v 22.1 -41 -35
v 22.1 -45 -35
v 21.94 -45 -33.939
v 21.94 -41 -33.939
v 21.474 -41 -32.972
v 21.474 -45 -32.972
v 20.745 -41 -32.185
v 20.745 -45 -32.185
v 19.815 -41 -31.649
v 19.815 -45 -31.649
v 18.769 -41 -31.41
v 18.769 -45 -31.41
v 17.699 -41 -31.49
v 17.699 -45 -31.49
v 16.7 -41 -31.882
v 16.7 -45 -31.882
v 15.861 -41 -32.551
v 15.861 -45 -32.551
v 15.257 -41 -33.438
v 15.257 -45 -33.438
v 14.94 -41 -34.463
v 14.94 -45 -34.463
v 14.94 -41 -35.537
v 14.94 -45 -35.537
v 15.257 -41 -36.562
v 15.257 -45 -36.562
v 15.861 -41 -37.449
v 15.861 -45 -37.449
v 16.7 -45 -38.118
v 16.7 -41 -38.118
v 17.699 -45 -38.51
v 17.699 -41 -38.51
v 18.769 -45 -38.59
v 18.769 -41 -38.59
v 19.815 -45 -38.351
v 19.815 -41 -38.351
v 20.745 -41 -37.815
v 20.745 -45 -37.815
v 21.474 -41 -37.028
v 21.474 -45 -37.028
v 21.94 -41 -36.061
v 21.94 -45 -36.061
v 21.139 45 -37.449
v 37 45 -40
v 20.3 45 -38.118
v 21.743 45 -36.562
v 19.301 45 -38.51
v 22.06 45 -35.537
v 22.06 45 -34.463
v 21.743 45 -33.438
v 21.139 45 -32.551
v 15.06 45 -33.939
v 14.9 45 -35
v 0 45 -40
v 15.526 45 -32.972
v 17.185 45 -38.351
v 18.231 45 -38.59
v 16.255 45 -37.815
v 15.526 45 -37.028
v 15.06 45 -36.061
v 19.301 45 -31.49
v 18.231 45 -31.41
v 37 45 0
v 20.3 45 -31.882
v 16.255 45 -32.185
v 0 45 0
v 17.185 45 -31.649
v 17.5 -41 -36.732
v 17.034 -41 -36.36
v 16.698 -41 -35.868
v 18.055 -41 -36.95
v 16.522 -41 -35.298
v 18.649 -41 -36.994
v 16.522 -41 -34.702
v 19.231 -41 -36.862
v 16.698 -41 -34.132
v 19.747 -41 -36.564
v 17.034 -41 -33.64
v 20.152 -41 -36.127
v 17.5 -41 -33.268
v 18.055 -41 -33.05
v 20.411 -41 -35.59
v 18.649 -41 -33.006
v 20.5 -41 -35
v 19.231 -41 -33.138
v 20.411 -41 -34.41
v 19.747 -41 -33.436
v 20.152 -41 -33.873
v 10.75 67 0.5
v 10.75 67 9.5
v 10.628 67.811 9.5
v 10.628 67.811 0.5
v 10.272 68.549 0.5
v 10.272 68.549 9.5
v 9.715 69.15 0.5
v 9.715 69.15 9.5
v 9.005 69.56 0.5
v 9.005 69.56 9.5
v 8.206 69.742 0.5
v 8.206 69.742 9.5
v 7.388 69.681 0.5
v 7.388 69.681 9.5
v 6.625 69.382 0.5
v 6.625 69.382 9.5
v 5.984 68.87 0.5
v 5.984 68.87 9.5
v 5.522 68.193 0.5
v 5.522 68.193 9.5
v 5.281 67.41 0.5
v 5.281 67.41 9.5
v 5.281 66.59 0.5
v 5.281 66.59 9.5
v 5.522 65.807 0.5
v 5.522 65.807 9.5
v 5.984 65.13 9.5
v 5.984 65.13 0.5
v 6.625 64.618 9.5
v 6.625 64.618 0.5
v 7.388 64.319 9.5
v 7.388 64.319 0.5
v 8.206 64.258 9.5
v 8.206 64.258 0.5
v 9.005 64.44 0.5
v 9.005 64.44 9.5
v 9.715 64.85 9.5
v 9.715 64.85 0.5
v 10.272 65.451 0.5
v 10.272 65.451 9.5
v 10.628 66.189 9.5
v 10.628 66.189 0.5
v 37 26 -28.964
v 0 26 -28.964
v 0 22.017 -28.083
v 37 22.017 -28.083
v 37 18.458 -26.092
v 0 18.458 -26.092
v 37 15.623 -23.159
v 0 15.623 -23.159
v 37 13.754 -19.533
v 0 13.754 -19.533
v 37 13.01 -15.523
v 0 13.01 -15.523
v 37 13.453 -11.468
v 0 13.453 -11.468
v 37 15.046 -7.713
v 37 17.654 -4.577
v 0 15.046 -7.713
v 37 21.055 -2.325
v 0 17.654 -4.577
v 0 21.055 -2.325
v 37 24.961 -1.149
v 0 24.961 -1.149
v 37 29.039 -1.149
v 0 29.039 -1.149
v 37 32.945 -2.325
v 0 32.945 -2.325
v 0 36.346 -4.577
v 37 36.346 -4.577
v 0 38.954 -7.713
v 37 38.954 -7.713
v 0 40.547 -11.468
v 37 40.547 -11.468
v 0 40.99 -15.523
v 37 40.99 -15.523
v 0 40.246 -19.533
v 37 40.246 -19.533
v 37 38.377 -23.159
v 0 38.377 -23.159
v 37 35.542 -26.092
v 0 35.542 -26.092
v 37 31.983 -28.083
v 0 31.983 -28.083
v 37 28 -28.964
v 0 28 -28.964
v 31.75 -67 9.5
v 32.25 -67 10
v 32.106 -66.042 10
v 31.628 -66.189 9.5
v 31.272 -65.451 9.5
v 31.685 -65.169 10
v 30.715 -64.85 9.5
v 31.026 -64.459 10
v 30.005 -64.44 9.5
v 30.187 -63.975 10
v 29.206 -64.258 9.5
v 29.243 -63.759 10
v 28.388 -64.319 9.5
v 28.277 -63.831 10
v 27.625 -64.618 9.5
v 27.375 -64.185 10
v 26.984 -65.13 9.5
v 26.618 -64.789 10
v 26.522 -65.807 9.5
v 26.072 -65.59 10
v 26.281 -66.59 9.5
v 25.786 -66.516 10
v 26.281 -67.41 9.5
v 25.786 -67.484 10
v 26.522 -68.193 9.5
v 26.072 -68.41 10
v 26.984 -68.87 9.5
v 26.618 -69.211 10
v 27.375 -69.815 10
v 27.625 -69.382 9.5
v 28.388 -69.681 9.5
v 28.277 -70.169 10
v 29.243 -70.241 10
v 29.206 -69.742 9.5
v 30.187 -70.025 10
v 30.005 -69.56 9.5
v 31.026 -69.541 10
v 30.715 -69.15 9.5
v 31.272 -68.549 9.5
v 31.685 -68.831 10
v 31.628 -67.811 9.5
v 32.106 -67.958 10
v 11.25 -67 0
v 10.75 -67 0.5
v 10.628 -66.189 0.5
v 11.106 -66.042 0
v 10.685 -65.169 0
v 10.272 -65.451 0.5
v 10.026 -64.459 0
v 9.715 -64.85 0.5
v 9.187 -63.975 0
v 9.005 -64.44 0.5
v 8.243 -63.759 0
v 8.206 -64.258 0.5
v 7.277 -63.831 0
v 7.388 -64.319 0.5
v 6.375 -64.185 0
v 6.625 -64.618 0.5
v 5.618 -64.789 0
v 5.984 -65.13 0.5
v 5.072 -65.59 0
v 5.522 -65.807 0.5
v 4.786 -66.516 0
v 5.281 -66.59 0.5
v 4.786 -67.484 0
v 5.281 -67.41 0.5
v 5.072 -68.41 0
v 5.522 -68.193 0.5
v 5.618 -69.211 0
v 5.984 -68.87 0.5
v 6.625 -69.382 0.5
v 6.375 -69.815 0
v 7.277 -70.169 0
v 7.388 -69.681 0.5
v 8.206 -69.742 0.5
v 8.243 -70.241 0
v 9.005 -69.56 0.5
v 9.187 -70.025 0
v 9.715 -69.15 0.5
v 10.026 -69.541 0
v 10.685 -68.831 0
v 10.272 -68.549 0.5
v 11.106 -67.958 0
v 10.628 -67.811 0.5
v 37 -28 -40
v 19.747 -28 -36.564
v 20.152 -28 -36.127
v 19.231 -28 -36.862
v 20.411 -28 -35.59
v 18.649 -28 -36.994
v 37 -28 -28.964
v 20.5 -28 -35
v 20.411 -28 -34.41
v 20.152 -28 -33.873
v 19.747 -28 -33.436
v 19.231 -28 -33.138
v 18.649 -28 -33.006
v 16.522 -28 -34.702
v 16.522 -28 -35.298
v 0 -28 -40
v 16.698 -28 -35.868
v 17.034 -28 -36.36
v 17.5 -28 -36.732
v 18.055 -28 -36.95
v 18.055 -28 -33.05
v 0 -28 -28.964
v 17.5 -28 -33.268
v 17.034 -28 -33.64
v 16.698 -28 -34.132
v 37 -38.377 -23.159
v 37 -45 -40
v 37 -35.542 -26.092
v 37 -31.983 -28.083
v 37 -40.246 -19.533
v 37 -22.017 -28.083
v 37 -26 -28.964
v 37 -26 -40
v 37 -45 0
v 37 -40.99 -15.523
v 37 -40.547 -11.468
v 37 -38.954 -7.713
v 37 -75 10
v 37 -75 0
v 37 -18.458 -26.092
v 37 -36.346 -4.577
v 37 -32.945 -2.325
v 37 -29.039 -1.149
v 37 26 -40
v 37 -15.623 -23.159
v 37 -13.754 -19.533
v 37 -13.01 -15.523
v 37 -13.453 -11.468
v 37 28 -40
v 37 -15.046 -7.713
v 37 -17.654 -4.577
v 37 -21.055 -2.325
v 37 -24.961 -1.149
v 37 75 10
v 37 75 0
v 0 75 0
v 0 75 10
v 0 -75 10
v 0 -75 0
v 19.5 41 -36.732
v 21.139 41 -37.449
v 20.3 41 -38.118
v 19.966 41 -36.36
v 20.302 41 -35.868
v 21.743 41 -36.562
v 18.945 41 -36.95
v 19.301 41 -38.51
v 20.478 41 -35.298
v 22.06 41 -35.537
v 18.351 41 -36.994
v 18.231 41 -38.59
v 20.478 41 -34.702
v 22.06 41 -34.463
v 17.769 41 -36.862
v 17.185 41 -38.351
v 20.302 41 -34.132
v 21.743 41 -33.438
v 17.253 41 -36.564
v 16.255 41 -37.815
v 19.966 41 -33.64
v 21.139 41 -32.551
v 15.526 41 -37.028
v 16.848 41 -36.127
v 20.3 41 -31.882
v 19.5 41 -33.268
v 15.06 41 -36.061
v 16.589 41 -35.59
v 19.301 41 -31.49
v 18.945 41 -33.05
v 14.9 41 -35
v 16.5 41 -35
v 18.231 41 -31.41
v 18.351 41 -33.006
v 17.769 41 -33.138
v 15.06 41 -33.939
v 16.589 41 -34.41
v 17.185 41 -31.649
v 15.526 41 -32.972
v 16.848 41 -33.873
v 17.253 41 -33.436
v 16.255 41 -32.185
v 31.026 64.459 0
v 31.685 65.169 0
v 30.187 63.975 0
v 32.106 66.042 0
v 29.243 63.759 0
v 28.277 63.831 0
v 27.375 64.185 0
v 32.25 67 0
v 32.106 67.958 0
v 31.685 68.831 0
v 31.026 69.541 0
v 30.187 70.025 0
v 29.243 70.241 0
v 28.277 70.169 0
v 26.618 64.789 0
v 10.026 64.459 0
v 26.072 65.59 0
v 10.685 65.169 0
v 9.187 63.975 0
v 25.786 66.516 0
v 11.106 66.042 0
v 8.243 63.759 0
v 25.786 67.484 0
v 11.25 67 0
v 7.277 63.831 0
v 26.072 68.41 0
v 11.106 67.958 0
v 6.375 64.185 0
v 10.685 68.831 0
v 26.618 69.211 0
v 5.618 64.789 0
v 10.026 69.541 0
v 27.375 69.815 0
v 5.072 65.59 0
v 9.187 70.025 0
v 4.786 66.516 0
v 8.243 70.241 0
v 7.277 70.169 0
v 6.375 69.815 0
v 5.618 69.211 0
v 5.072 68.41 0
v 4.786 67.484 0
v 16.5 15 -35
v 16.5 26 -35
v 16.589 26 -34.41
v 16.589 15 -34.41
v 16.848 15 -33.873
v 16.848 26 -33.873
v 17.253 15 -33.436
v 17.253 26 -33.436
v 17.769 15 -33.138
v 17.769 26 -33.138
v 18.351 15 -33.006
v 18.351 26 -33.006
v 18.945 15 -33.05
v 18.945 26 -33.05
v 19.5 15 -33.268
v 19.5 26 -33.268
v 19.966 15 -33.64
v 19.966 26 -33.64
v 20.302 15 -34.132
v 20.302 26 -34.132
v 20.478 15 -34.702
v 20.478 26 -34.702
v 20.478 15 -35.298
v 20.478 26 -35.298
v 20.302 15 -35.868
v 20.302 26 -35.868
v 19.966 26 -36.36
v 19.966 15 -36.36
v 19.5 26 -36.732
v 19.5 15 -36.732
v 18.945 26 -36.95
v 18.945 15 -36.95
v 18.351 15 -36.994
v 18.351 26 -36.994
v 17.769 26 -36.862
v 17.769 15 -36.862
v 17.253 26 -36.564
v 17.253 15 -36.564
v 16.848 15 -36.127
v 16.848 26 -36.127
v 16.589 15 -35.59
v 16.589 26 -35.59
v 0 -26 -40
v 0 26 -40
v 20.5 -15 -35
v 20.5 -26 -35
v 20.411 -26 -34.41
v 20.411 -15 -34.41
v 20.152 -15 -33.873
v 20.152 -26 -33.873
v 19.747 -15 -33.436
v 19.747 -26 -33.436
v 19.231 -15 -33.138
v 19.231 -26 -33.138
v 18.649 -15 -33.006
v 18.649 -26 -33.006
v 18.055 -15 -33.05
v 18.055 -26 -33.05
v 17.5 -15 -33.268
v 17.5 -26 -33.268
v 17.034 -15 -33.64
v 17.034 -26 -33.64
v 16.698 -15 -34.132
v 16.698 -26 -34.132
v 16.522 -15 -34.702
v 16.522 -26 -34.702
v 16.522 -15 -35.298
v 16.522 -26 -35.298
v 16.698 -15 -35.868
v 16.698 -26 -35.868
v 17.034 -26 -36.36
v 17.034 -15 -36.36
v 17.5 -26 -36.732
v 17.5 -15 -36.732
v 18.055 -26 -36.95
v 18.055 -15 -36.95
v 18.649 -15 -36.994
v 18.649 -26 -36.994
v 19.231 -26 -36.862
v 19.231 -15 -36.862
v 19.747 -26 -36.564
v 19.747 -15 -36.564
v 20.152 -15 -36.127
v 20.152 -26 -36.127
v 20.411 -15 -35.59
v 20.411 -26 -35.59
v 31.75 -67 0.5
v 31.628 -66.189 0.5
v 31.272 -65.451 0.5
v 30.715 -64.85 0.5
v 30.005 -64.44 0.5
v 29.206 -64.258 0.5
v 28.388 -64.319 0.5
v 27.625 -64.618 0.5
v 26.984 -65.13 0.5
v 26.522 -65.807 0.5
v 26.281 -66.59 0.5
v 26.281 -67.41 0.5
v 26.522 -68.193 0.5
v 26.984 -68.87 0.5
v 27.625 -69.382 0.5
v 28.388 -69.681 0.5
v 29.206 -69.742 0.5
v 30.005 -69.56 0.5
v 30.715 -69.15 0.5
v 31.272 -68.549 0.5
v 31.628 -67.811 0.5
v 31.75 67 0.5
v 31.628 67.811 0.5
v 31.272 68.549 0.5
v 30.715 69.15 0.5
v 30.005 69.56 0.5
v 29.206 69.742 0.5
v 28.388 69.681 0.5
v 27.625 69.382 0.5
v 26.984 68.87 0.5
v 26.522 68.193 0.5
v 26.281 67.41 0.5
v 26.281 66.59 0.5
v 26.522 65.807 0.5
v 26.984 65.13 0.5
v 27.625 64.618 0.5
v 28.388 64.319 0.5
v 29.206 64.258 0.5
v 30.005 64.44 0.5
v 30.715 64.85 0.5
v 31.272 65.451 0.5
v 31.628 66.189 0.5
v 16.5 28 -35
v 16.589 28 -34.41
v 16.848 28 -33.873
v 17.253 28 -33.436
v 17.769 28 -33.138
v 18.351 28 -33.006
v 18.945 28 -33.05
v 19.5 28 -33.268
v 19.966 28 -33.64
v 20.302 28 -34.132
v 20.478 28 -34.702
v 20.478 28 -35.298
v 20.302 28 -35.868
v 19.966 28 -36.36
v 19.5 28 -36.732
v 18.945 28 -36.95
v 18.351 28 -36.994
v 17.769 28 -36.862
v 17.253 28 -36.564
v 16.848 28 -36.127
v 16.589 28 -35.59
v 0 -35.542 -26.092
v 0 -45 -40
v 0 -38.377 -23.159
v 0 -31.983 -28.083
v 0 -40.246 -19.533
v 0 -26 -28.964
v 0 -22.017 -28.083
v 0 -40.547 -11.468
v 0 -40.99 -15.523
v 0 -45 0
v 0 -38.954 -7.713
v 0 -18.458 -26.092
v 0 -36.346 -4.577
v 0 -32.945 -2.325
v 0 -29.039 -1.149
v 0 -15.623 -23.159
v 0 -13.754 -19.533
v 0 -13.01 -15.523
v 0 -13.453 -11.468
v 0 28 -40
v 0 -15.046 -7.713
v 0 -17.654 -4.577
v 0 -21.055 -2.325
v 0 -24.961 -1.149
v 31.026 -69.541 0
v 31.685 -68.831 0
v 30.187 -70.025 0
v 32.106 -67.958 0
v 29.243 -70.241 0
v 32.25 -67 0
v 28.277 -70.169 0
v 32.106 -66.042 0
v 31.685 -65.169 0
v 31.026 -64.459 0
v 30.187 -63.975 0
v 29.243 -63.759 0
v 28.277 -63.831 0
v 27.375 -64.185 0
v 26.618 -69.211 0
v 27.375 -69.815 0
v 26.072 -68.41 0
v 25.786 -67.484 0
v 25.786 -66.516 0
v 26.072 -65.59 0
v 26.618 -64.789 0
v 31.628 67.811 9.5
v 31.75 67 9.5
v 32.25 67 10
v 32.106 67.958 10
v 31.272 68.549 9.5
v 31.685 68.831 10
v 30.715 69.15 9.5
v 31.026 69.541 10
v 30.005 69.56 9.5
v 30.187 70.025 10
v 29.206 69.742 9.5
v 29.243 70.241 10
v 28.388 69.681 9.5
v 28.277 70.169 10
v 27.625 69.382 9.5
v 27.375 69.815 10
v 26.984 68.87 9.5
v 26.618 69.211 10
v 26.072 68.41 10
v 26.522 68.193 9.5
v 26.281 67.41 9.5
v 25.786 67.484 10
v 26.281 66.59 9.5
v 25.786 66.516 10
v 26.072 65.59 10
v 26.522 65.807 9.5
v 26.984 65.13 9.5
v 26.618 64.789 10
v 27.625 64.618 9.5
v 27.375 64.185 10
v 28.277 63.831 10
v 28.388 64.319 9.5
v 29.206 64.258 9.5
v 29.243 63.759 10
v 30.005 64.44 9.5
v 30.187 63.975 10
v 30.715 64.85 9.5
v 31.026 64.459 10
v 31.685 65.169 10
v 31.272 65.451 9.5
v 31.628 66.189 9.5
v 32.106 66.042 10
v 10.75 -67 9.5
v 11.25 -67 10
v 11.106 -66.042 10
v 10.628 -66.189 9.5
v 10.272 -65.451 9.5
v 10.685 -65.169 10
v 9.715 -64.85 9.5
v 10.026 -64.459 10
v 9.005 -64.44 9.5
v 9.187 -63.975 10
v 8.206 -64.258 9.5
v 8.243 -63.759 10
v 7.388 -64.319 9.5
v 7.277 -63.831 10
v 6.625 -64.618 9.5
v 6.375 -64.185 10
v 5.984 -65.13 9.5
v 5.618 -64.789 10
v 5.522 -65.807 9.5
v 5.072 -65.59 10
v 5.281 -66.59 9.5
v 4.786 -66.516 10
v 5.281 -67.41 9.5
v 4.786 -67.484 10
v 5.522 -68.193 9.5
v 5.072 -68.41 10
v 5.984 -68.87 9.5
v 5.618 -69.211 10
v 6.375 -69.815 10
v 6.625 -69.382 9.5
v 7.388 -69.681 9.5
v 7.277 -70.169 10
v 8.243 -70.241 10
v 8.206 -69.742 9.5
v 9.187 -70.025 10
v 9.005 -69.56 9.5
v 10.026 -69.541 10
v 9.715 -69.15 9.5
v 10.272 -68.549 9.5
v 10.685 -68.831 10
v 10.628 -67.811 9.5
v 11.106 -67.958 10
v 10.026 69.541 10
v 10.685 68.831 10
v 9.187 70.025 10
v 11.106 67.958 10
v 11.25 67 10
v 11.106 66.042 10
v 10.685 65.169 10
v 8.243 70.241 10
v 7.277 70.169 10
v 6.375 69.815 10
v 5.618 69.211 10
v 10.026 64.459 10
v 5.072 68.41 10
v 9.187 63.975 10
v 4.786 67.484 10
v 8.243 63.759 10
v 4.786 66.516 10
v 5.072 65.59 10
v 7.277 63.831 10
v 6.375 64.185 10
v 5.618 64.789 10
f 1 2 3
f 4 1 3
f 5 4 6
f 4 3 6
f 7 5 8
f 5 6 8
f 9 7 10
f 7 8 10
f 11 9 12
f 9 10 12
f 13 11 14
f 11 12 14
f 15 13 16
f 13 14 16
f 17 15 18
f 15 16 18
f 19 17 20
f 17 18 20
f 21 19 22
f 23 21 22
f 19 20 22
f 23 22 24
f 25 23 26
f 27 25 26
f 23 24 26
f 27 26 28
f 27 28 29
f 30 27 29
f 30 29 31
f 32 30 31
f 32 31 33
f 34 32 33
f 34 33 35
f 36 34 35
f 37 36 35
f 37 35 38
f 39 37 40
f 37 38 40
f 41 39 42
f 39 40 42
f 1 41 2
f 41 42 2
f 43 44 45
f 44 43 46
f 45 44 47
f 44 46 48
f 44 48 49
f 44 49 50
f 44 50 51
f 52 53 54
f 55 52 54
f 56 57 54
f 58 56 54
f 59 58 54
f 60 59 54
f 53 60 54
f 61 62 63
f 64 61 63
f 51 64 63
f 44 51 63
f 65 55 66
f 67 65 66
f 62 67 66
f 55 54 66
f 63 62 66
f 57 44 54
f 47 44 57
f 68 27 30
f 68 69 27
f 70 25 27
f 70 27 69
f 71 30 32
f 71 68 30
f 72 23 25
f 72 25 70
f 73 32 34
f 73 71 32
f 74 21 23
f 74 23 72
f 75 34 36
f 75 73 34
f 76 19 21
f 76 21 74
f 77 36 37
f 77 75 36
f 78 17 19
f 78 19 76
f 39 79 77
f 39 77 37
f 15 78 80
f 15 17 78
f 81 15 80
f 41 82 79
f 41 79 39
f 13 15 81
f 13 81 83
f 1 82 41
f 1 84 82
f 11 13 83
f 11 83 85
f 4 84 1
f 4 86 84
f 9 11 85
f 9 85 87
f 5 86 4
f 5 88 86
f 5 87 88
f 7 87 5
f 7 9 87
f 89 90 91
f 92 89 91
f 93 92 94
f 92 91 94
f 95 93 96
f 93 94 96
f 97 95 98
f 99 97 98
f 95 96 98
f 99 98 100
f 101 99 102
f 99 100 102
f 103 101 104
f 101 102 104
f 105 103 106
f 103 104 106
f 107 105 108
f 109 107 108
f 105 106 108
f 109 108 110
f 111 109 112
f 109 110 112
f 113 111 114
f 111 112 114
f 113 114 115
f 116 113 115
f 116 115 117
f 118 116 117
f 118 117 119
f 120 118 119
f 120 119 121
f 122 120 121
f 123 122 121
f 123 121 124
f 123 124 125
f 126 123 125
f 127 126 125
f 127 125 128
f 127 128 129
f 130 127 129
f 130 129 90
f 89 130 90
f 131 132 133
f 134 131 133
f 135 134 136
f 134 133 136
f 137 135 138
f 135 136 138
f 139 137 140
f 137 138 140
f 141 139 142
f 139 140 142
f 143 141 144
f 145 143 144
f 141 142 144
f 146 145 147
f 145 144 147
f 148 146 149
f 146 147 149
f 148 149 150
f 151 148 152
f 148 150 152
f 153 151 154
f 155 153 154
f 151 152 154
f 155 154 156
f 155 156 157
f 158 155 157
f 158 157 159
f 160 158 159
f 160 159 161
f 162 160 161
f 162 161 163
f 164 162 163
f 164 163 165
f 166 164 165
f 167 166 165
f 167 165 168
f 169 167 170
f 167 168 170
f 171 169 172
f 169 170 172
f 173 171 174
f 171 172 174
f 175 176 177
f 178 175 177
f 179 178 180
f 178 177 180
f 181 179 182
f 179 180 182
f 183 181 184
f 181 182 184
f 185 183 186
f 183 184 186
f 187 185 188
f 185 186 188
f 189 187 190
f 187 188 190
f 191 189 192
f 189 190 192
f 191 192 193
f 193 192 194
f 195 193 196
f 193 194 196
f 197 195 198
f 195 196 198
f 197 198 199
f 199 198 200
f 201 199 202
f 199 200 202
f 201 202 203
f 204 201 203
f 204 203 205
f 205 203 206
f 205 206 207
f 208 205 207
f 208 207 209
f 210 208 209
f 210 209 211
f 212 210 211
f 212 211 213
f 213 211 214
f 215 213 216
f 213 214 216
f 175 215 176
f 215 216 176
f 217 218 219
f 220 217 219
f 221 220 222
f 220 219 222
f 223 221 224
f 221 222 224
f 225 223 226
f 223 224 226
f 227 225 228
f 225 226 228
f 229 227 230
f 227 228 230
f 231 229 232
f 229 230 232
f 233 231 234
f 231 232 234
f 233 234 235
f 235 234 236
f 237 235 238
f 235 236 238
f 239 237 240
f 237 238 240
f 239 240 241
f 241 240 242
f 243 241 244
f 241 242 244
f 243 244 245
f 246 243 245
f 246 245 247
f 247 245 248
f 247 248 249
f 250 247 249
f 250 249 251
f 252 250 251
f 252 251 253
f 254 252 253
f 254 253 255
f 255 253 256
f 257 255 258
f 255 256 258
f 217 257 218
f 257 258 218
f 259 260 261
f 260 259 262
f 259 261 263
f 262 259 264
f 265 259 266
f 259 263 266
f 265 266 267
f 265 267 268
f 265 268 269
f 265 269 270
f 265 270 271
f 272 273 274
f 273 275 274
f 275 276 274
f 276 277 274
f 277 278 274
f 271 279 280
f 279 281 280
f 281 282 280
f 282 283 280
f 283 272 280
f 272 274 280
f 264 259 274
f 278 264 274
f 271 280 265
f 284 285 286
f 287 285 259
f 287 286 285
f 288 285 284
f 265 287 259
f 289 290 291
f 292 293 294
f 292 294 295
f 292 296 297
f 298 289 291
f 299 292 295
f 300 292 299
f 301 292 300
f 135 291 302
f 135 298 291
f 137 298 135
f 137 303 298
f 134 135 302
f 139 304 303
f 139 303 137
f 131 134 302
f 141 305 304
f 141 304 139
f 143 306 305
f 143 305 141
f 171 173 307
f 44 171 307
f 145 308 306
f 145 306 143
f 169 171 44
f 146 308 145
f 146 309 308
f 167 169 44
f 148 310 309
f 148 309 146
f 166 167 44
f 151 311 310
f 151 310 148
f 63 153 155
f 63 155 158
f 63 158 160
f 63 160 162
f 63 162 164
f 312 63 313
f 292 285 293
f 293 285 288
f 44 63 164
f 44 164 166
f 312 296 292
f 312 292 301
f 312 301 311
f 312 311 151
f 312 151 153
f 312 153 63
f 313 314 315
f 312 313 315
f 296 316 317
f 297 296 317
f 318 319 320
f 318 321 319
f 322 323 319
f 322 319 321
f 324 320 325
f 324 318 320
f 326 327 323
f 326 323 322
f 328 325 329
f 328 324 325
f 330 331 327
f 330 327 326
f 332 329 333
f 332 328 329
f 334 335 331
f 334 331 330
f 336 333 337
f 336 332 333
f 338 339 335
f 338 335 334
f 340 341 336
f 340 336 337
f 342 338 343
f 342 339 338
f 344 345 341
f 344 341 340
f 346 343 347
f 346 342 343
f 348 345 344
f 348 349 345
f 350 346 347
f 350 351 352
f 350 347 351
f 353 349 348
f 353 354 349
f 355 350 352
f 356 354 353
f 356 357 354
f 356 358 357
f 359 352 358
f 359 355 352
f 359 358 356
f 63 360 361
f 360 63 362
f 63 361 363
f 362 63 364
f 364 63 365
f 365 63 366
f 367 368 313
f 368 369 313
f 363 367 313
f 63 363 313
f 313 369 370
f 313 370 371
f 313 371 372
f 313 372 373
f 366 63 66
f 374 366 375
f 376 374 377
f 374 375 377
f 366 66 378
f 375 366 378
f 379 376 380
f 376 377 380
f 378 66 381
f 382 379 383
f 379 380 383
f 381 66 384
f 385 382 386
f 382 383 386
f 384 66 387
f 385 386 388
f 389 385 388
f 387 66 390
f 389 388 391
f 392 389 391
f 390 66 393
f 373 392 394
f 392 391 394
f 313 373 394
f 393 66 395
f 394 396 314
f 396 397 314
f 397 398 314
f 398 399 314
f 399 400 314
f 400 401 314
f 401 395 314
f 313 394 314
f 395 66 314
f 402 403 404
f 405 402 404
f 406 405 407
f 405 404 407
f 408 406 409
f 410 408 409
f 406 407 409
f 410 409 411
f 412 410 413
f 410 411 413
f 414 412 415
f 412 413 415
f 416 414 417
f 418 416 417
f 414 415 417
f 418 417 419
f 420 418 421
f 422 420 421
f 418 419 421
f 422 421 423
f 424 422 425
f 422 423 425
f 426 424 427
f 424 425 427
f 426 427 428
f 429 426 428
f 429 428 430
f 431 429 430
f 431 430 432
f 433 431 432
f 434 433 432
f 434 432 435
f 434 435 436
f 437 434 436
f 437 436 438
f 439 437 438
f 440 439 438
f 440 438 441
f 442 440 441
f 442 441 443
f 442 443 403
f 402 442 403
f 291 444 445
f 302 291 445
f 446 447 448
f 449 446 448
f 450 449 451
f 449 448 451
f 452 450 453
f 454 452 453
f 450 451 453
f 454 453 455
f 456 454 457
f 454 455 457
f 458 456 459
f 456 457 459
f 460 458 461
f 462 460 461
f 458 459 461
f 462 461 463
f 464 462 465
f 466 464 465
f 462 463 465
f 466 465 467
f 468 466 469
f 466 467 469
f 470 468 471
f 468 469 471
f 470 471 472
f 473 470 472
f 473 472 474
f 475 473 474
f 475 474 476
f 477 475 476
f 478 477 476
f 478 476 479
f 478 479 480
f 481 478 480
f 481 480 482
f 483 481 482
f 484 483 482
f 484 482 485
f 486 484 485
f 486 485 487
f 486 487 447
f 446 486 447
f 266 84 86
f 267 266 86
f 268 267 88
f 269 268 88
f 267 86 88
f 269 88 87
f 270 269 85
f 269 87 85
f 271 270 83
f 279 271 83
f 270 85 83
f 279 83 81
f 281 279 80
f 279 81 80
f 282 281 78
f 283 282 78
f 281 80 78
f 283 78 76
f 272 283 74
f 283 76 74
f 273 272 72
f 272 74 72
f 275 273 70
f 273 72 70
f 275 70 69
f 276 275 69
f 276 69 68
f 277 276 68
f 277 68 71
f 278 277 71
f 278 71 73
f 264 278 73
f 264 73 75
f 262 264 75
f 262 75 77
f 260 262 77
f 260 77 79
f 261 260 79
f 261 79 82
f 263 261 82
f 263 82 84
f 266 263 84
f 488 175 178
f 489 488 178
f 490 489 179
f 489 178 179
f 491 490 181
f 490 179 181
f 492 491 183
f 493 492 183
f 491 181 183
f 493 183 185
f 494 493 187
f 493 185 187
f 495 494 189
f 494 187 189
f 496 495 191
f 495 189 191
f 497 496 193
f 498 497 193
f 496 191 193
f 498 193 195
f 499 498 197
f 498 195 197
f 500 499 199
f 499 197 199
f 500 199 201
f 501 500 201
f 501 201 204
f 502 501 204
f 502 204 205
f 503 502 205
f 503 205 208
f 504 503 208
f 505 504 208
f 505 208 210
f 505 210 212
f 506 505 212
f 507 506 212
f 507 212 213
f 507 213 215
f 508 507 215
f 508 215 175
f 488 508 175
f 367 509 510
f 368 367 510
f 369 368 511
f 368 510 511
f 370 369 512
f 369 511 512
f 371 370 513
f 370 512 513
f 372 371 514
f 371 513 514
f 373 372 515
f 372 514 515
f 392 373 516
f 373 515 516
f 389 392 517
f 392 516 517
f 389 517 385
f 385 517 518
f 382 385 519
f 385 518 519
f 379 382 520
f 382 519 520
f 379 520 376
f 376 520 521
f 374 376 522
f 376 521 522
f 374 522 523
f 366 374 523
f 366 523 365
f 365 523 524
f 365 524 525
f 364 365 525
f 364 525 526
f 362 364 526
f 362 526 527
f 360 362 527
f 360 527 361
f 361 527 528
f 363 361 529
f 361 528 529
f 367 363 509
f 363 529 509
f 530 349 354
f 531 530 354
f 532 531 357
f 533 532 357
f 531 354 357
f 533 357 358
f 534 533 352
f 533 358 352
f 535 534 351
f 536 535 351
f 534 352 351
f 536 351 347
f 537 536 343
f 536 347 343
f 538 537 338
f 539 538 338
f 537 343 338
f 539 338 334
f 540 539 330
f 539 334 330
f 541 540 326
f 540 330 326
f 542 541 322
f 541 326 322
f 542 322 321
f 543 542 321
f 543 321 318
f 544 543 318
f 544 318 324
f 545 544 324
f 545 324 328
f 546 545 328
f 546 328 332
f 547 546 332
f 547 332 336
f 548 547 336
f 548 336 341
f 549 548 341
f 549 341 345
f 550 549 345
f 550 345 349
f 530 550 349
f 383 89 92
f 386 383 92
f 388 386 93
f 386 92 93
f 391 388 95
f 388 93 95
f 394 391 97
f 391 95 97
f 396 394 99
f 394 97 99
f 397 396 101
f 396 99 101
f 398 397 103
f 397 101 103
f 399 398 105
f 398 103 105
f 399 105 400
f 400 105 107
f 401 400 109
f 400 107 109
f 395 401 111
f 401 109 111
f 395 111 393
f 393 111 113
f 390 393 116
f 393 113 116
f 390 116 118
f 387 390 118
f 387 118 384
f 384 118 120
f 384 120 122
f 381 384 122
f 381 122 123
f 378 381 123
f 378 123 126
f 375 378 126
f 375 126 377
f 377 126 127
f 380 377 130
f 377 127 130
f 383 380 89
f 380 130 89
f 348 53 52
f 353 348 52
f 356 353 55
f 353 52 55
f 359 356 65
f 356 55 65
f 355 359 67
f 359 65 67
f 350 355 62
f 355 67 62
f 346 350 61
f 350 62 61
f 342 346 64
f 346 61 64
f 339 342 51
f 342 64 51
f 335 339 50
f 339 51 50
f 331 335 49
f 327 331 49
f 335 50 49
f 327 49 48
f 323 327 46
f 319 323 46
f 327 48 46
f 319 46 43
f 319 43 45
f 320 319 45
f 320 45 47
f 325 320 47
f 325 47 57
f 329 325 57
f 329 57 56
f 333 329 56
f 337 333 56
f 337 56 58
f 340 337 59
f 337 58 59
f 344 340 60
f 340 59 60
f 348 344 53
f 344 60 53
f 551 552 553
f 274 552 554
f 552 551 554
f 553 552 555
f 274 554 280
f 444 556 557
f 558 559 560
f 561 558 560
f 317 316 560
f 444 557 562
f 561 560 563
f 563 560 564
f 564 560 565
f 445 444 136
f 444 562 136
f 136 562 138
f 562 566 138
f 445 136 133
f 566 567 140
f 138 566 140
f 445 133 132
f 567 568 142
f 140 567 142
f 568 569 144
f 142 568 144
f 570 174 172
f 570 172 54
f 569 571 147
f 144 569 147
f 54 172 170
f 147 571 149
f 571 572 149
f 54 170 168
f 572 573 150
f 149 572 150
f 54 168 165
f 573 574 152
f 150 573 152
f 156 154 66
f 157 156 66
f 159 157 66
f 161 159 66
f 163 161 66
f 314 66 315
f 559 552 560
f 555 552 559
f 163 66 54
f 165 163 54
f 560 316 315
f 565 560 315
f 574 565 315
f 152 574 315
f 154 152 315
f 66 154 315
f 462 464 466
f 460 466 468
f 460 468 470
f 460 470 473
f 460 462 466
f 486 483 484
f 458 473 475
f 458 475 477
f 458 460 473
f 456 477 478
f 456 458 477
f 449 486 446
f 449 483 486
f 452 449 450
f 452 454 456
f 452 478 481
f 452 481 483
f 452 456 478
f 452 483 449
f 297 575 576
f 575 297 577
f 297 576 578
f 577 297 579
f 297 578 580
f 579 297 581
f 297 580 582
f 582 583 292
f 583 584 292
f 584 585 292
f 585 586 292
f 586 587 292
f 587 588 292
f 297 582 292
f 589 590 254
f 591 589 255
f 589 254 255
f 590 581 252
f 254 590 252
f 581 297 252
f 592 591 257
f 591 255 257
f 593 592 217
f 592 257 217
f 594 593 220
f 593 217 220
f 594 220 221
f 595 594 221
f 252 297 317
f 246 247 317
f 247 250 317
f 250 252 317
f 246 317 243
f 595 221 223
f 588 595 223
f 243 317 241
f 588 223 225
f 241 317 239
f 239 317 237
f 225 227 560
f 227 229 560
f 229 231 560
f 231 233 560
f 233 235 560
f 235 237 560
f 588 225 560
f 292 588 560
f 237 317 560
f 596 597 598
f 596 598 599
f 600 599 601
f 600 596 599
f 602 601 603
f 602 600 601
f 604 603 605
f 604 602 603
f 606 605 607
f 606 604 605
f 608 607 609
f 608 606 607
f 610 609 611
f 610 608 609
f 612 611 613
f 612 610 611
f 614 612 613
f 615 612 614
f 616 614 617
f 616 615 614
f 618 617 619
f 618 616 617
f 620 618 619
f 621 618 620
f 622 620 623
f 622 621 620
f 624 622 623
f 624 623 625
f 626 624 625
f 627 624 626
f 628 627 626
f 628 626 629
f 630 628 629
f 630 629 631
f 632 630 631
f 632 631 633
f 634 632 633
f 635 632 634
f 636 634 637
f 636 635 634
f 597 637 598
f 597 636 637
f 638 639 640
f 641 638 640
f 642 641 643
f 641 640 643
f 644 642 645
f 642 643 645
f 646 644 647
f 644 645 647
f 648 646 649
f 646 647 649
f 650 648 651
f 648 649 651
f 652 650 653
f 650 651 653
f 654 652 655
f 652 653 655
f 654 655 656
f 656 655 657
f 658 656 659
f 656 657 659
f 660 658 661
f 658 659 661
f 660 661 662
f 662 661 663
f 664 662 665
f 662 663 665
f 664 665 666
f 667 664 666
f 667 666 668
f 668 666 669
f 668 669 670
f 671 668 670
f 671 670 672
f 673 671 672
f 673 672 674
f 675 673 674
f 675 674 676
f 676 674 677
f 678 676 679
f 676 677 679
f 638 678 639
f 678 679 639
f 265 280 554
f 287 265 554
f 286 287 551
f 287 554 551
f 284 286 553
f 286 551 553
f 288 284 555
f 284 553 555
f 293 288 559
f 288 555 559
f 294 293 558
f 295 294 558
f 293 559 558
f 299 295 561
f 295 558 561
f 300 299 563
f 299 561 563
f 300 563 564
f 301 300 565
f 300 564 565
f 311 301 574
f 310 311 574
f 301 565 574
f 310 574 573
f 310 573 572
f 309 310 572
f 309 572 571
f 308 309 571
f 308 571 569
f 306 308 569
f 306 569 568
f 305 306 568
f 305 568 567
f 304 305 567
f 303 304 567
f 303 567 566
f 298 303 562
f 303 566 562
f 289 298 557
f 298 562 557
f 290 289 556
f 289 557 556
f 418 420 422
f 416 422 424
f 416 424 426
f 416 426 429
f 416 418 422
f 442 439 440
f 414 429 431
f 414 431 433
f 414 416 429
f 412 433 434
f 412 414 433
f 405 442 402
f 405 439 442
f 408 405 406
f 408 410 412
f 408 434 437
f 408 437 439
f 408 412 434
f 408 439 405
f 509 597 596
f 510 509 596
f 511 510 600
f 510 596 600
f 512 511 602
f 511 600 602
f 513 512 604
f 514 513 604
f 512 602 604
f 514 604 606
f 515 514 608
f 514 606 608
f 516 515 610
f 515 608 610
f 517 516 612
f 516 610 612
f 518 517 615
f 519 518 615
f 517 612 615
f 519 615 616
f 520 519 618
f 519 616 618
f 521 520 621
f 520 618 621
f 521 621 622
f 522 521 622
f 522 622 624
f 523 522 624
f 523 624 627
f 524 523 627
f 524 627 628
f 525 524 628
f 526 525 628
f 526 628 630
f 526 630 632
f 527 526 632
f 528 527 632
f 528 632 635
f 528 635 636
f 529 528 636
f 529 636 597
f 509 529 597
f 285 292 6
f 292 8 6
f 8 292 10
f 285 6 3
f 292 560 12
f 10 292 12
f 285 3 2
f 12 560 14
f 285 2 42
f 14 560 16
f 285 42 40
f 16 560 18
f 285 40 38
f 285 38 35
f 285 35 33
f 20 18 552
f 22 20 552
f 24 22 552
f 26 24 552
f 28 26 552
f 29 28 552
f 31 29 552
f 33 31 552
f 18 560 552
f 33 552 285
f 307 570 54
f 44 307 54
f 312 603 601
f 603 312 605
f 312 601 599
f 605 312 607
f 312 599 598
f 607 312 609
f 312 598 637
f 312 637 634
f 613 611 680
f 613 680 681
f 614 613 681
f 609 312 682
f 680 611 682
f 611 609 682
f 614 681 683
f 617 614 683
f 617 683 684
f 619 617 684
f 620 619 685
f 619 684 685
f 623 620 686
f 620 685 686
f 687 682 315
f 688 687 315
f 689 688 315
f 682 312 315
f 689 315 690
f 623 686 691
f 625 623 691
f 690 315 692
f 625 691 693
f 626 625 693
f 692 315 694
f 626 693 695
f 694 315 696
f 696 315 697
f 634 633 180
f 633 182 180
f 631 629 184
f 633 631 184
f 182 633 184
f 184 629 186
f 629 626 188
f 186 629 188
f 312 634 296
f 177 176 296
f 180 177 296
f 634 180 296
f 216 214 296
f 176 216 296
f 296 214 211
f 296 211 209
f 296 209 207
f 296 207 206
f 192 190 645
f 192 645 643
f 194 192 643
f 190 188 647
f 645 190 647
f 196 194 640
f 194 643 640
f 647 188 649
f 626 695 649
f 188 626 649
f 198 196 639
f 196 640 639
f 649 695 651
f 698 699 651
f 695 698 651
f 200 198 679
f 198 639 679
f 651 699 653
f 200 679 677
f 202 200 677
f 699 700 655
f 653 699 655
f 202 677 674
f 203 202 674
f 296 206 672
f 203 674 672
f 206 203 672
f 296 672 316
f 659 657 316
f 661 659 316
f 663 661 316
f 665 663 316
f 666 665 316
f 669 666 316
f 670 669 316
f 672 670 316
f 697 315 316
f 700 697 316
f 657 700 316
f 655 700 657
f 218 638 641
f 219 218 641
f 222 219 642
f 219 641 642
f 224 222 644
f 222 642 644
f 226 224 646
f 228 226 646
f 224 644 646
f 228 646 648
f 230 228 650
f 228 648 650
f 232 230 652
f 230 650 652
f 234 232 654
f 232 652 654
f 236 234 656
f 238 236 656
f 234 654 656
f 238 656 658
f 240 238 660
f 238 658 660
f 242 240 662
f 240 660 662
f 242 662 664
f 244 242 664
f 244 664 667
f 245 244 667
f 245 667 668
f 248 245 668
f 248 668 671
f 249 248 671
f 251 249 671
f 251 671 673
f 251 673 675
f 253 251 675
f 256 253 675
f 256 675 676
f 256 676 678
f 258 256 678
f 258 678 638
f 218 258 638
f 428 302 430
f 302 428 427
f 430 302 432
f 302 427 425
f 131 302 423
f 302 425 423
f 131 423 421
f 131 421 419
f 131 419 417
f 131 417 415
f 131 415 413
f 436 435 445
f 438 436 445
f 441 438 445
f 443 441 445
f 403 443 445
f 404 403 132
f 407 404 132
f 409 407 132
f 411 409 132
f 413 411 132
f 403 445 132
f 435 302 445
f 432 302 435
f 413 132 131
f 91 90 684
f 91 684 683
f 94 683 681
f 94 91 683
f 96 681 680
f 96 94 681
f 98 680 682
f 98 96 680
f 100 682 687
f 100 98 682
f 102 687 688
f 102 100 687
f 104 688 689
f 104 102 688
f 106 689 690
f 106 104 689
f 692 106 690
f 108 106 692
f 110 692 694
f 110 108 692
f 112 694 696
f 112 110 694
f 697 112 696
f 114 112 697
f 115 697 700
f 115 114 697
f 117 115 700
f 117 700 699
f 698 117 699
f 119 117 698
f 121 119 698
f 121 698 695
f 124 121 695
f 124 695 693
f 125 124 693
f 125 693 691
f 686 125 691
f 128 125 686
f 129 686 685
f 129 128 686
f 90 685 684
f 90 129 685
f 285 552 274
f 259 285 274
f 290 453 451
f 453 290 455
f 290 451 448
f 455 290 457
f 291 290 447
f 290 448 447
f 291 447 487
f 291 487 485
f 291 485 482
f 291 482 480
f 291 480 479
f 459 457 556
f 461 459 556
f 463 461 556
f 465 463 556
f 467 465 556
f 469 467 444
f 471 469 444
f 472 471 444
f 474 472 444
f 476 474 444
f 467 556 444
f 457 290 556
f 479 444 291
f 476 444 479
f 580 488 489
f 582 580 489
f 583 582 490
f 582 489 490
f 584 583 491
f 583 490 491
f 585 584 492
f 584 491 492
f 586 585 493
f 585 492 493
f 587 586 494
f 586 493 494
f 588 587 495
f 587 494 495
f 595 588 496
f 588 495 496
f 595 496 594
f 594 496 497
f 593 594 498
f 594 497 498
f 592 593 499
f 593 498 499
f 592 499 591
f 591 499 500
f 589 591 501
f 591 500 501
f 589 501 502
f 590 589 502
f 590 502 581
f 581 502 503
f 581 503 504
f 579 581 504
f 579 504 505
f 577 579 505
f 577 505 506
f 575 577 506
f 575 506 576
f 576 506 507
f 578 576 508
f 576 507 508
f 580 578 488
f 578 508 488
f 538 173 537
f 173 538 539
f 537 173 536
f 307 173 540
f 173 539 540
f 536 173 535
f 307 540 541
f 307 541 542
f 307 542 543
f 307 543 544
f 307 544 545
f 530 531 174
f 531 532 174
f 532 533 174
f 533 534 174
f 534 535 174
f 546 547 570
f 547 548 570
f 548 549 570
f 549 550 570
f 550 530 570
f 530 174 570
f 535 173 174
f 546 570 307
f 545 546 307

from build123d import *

# Parameters (mm, degrees)
F1_DEPTH  = 37
F2_R      = 2
F3_DEPTH  = 30
F4_R      = 3.6
F5_DEPTH  = 4
F6_R      = 2
F7_DEPTH  = 30
F8_R      = 3.6
F9_DEPTH  = 4
F10_R     = 2.75
F11_DEPTH = 50.001
F12_SIZE  = 0.5


with BuildPart() as f1:
    # F0 (on Right) → F1 (new body)
    with BuildSketch(Plane.YZ):
        with BuildLine():
            Line((-45, 0), (-45, -40))
            Line((-45, -40), (-28, -40))
            Line((-28, -40), (-28, -28.9642400438))
            ThreePointArc((-28, -28.9642400438), (-27, -1), (-26, -28.9642400438))
            Line((-26, -28.9642400438), (-26, -40))
            Line((-26, -40), (26, -40))
            Line((26, -40), (26, -28.9642400438))
            ThreePointArc((26, -28.9642400438), (27, -1), (28, -28.9642400438))
            Line((28, -28.9642400438), (28, -40))
            Line((28, -40), (45, -40))
            Line((45, -40), (45, 0))
            Line((45, 0), (75, 0))
            Line((75, 0), (75, 10))
            Line((75, 10), (-75, 10))
            Line((-75, 10), (-75, 0))
            Line((-75, 0), (-45, 0))
        make_face()
    extrude(amount=F1_DEPTH)

    # F2 (on face) → F3 (cut)
    with BuildSketch(Plane.XZ.offset(45)):
        with Locations((18.5, -35)):
            Circle(F2_R)
    extrude(amount=-F3_DEPTH, mode=Mode.SUBTRACT)

    # F4 (on face) → F5 (cut)
    with BuildSketch(Plane.XZ.offset(45)):
        with Locations((18.5, -35)):
            Circle(F4_R)
    extrude(amount=-F5_DEPTH, mode=Mode.SUBTRACT)

    # F6 (on face) → F7 (cut)
    with BuildSketch(Plane(origin=(0, 45, 0), x_dir=(-1, 0, 0), z_dir=(0, 1, 0))):
        with Locations((-18.5, -35)):
            Circle(F6_R)
    extrude(amount=-F7_DEPTH, mode=Mode.SUBTRACT)

    # F8 (on face) → F9 (cut)
    with BuildSketch(Plane(origin=(0, 45, 0), x_dir=(-1, 0, 0), z_dir=(0, 1, 0))):
        with Locations((-18.5, -35)):
            Circle(F8_R)
    extrude(amount=-F9_DEPTH, mode=Mode.SUBTRACT)

    # F10 (on face) → F11 (cut, through all)
    with BuildSketch(Plane.XY.offset(10)):
        with Locations((29, 67)):
            Circle(F10_R)
        with Locations((8, 67)):
            Circle(F10_R)
        with Locations((8, -67)):
            Circle(F10_R)
        with Locations((29, -67)):
            Circle(F10_R)
    extrude(amount=-F11_DEPTH, mode=Mode.SUBTRACT)

    # F12
    f12_edges = [f1.edges().sort_by_distance(p)[0] for p in [
        (5.25, 67, 10),
        (10.75, 67, 5),
        (5.25, 67, 0),
        (26.25, 67, 10),
        (31.75, 67, 5),
        (26.25, 67, 0),
        (5.25, -67, 10),
        (10.75, -67, 5),
        (5.25, -67, 0),
        (26.25, -67, 10),
        (31.75, -67, 5),
        (26.25, -67, 0),
    ]]
    chamfer(f12_edges, length=F12_SIZE)


solid = f1.part
